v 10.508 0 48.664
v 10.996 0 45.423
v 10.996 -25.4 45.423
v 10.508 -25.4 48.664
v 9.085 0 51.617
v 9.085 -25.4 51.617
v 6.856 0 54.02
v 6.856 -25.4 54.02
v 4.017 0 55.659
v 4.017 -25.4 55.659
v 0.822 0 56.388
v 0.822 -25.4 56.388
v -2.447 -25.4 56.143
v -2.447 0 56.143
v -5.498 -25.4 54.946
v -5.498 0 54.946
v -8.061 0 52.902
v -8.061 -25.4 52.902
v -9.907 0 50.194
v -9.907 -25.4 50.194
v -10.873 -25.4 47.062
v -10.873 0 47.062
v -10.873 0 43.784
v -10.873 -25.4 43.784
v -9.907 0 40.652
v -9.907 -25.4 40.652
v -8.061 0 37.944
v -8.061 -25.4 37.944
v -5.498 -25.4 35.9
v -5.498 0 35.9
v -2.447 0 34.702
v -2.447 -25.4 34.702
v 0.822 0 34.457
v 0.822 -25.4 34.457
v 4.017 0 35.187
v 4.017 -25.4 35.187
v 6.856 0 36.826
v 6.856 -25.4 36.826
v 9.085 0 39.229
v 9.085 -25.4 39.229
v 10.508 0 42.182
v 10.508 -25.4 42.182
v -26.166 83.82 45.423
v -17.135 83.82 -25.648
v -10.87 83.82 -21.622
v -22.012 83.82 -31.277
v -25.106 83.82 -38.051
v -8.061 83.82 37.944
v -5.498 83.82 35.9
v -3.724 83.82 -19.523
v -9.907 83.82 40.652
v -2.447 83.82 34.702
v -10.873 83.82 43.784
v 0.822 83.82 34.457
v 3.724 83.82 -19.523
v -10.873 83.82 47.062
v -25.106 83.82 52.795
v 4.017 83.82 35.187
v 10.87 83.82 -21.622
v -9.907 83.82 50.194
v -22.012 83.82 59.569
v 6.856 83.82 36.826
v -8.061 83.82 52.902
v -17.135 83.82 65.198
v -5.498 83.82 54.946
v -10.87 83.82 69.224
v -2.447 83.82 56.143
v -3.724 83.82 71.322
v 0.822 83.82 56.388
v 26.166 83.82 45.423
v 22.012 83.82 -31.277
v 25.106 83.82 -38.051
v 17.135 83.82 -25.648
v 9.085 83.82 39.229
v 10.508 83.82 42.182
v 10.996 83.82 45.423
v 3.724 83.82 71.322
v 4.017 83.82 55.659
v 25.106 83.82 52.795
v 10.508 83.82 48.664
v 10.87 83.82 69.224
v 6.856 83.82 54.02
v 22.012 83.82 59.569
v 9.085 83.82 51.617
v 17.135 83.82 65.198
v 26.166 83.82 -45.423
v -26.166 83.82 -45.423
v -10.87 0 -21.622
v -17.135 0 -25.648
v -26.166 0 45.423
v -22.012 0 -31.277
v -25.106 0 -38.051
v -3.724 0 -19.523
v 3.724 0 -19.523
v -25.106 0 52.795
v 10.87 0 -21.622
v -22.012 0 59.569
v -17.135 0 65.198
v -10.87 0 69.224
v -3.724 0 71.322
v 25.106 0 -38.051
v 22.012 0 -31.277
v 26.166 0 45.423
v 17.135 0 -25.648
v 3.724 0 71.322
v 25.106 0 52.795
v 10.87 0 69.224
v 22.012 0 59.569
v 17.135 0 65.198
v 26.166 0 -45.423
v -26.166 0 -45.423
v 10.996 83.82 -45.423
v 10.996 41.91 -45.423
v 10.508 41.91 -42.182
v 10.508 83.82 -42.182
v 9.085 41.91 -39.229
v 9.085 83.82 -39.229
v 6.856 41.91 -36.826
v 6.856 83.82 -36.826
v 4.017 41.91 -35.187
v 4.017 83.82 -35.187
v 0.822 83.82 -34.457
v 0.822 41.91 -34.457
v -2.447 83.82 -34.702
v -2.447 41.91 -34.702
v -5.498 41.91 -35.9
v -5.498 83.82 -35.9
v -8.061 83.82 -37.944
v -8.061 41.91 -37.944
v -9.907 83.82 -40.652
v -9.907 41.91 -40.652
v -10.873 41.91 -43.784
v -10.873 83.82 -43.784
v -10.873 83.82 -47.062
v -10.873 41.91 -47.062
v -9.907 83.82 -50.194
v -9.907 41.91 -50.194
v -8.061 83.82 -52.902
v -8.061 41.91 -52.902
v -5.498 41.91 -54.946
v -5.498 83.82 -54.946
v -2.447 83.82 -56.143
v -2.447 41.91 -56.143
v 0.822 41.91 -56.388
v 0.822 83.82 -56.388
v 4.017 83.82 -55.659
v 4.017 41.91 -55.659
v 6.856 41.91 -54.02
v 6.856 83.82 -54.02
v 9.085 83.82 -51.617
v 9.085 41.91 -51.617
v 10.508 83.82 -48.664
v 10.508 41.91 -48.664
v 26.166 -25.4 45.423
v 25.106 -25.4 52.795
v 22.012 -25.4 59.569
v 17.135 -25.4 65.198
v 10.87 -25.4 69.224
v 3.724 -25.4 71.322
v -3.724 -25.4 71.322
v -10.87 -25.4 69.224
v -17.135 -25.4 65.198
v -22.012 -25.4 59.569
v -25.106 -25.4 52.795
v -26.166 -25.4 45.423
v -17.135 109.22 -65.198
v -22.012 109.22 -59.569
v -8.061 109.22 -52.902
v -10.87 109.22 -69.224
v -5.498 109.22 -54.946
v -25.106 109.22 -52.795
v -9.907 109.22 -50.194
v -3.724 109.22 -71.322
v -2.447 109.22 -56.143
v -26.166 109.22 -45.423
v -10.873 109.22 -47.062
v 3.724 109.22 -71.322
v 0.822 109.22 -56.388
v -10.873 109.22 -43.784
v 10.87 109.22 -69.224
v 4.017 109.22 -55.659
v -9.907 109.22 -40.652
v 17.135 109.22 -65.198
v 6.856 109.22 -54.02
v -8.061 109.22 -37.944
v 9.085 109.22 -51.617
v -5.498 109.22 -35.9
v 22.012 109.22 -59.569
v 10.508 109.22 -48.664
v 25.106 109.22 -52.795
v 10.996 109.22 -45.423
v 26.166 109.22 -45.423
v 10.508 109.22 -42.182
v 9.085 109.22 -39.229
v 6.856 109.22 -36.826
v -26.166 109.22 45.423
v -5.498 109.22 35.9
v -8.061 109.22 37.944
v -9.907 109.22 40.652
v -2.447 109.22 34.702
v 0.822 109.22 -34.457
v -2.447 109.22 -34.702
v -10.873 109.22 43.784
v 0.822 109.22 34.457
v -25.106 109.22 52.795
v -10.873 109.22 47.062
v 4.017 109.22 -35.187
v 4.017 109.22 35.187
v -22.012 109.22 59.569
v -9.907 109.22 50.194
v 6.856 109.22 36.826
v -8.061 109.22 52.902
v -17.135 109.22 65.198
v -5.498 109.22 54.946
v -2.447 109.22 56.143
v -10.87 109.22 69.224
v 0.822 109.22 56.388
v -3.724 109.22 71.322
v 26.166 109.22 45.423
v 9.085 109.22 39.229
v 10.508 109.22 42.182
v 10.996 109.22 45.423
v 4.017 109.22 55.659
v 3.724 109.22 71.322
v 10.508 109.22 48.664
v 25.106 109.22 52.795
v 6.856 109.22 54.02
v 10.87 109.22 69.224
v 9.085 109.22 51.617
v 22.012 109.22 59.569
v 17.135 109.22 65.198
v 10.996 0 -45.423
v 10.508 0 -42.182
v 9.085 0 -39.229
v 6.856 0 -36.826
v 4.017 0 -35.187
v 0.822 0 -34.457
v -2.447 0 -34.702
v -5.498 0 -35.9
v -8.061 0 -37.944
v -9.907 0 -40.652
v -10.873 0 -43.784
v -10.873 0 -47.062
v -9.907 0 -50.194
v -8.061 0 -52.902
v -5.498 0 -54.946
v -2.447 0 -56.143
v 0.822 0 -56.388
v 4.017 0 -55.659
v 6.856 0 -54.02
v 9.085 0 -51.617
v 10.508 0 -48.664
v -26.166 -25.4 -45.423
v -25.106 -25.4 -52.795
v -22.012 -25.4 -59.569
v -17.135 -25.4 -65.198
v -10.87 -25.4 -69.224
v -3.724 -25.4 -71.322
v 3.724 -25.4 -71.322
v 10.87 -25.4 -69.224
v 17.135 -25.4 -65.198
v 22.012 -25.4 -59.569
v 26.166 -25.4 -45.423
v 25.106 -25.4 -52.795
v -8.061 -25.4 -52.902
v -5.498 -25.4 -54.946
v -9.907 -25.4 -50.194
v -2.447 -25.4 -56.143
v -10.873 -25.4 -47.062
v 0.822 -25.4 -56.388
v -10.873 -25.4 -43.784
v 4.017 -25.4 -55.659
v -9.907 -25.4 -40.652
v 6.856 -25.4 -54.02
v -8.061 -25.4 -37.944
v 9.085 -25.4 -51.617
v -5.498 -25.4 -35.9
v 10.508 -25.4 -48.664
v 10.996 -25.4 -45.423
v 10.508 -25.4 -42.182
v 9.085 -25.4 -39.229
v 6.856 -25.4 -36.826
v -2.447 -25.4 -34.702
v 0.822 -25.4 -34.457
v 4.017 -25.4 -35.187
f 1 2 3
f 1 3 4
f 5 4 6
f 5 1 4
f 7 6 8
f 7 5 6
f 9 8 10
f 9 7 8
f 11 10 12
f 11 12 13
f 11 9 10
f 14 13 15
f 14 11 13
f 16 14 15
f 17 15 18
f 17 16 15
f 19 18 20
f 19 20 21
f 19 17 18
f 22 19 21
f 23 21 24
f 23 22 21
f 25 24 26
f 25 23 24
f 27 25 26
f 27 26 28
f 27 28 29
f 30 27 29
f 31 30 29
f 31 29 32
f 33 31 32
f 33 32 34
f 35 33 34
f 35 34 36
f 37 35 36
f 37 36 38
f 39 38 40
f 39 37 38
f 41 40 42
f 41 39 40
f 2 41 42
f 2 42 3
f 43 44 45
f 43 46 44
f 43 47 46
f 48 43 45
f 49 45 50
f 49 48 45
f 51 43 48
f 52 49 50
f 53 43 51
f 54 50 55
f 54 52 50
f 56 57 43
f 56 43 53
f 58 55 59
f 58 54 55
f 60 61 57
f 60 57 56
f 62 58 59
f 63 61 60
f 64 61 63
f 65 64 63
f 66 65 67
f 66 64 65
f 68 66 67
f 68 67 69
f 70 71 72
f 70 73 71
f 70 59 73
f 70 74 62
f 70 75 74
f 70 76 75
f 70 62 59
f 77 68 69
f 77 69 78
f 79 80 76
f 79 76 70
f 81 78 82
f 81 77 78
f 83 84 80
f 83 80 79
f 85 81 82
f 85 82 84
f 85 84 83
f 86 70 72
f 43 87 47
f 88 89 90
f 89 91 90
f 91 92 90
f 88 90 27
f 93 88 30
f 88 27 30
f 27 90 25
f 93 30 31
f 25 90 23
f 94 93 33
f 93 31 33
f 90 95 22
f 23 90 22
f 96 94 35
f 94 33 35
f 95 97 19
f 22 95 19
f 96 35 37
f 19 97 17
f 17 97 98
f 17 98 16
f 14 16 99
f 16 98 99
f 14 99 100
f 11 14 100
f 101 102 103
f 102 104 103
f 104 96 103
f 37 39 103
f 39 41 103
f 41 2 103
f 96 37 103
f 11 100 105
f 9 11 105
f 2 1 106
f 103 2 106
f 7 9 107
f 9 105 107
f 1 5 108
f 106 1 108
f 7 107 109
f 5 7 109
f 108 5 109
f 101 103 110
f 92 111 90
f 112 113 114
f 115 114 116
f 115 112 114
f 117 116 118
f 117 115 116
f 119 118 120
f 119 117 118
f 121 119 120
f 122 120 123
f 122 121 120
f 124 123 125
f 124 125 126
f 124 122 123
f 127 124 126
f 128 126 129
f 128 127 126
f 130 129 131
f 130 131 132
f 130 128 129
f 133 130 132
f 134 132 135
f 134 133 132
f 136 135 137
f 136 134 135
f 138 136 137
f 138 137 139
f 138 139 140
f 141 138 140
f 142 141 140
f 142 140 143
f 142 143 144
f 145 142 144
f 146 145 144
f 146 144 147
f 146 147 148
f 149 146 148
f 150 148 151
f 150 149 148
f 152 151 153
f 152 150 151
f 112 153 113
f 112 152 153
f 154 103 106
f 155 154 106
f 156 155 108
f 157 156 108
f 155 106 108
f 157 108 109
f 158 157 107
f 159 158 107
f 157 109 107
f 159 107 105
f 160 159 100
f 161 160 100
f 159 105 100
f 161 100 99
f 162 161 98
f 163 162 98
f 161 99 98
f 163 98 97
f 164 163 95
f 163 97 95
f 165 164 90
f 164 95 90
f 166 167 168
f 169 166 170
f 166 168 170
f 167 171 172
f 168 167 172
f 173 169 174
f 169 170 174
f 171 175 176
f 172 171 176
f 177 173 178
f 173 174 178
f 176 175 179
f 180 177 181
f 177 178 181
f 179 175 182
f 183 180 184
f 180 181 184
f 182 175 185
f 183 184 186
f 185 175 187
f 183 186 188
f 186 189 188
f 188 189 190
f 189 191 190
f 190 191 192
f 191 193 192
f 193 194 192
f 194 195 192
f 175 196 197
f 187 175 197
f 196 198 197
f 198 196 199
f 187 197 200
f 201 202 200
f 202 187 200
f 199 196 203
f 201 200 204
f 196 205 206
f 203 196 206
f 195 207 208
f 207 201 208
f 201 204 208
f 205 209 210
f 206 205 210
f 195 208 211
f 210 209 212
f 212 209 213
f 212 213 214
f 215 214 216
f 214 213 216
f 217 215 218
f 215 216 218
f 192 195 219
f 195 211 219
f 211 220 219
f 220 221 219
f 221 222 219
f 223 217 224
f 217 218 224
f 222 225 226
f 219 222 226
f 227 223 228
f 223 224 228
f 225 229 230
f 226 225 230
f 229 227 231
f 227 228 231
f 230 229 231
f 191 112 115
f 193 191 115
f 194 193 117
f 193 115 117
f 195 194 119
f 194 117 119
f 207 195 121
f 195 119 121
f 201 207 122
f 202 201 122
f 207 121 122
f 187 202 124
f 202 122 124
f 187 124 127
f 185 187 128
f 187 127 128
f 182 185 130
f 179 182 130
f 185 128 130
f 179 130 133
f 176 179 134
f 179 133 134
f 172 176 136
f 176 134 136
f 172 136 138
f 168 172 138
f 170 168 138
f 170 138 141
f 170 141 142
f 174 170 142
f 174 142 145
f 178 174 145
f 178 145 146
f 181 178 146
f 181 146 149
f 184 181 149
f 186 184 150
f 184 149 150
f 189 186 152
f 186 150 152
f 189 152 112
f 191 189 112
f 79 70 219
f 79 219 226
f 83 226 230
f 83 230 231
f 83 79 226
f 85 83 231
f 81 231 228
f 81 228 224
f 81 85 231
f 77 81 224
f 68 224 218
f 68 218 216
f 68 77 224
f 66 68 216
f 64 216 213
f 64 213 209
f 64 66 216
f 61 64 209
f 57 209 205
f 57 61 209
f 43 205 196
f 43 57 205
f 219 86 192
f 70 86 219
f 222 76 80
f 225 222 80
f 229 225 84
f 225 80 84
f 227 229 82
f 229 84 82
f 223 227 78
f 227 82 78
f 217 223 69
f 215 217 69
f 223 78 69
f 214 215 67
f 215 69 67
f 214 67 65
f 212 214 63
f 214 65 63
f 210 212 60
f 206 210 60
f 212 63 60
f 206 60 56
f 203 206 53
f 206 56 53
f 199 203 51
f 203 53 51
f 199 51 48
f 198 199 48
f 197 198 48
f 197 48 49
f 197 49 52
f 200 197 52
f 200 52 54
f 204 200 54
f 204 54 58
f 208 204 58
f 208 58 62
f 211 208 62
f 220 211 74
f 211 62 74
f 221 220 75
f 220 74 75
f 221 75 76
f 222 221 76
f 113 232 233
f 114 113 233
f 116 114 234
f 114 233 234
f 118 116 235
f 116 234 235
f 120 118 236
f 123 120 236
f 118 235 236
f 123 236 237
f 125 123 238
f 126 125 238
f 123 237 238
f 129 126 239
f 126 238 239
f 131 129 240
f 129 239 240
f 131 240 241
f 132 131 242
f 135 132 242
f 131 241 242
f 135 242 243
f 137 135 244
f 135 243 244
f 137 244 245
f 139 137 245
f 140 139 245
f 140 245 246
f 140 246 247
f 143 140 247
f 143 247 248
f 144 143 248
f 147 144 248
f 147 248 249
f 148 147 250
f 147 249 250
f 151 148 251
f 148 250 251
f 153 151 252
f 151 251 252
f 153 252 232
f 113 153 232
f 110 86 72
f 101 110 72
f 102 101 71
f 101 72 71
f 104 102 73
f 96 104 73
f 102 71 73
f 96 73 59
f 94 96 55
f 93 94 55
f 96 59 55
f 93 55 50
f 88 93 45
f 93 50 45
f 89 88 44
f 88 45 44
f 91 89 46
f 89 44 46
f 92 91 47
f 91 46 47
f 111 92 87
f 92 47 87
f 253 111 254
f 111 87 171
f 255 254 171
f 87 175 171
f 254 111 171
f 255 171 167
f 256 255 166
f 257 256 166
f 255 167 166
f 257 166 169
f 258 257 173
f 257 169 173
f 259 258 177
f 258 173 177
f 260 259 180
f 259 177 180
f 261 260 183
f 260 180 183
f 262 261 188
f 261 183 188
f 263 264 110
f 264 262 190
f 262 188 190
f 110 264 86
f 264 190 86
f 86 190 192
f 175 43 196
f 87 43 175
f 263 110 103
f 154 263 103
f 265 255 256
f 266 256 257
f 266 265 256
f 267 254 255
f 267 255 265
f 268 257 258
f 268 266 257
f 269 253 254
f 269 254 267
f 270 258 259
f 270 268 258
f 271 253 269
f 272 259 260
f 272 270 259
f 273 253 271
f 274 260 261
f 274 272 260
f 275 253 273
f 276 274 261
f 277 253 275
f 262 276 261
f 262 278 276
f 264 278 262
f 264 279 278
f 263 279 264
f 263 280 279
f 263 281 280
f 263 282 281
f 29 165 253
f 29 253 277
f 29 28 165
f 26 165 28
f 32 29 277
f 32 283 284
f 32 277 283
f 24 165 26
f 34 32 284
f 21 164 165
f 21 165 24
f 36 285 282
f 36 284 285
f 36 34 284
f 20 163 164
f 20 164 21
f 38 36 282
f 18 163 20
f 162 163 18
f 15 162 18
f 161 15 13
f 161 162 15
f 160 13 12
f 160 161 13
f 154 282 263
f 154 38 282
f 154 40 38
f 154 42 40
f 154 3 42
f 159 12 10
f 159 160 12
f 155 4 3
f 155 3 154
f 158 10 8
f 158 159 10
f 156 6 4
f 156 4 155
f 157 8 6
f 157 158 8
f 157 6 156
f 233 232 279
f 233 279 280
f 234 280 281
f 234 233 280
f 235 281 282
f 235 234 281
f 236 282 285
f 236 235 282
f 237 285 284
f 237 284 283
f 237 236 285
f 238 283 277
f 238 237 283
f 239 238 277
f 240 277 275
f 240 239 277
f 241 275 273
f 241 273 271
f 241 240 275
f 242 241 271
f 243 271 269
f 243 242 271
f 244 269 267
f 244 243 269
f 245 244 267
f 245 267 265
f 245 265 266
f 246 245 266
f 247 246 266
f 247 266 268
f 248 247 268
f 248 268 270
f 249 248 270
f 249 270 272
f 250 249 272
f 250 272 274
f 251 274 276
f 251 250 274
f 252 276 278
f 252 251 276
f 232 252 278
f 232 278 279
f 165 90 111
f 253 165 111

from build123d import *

# Parameters (mm, degrees)
F0_R     = 10.99621
F1_DEPTH = 25.4
F2_DEPTH = 41.91


with BuildPart() as f1:
    # F0 (on Front) → F1 (new body)
    with BuildSketch(Plane.XZ):
        with BuildLine():
            ThreePointArc((26.165782, 45.422908), (0, 71.588689), (-26.165782, 45.422908))
            Line((-26.165782, 45.422908), (-26.165782, -45.422908))
            ThreePointArc((-26.165782, -45.422908), (0, -19.257126), (26.165782, -45.422908))
            Line((26.165782, -45.422908), (26.165782, 45.422908))
        make_face()
        with Locations((0, 45.422908)):
            Circle(F0_R, mode=Mode.SUBTRACT)
        with BuildLine():
            ThreePointArc((26.165782, -45.422908), (0, -19.257126), (-26.165782, -45.422908))
            ThreePointArc((-26.165782, -45.422908), (0, -71.588689), (26.165782, -45.422908))
        make_face()
        with Locations((0, -45.422908)):
            Circle(F0_R, mode=Mode.SUBTRACT)
    extrude(amount=F1_DEPTH)

    # F0 (on Front) → F2 (join)
    with BuildSketch(Plane.XZ):
        with BuildLine():
            ThreePointArc((26.165782, -45.422908), (0, -19.257126), (-26.165782, -45.422908))
            ThreePointArc((-26.165782, -45.422908), (0, -71.588689), (26.165782, -45.422908))
        make_face()
        with Locations((0, -45.422908)):
            Circle(F0_R, mode=Mode.SUBTRACT)
    extrude(amount=-F2_DEPTH)

    # F3: F1 across face


with BuildPart() as f1_1:
    add(f1.part)
    add(f1.part.mirror(Plane(origin=(0, 41.91, -45.422908), x_dir=(1, 0, 0), z_dir=(0, 1, 0))))


solid = f1_1.part
